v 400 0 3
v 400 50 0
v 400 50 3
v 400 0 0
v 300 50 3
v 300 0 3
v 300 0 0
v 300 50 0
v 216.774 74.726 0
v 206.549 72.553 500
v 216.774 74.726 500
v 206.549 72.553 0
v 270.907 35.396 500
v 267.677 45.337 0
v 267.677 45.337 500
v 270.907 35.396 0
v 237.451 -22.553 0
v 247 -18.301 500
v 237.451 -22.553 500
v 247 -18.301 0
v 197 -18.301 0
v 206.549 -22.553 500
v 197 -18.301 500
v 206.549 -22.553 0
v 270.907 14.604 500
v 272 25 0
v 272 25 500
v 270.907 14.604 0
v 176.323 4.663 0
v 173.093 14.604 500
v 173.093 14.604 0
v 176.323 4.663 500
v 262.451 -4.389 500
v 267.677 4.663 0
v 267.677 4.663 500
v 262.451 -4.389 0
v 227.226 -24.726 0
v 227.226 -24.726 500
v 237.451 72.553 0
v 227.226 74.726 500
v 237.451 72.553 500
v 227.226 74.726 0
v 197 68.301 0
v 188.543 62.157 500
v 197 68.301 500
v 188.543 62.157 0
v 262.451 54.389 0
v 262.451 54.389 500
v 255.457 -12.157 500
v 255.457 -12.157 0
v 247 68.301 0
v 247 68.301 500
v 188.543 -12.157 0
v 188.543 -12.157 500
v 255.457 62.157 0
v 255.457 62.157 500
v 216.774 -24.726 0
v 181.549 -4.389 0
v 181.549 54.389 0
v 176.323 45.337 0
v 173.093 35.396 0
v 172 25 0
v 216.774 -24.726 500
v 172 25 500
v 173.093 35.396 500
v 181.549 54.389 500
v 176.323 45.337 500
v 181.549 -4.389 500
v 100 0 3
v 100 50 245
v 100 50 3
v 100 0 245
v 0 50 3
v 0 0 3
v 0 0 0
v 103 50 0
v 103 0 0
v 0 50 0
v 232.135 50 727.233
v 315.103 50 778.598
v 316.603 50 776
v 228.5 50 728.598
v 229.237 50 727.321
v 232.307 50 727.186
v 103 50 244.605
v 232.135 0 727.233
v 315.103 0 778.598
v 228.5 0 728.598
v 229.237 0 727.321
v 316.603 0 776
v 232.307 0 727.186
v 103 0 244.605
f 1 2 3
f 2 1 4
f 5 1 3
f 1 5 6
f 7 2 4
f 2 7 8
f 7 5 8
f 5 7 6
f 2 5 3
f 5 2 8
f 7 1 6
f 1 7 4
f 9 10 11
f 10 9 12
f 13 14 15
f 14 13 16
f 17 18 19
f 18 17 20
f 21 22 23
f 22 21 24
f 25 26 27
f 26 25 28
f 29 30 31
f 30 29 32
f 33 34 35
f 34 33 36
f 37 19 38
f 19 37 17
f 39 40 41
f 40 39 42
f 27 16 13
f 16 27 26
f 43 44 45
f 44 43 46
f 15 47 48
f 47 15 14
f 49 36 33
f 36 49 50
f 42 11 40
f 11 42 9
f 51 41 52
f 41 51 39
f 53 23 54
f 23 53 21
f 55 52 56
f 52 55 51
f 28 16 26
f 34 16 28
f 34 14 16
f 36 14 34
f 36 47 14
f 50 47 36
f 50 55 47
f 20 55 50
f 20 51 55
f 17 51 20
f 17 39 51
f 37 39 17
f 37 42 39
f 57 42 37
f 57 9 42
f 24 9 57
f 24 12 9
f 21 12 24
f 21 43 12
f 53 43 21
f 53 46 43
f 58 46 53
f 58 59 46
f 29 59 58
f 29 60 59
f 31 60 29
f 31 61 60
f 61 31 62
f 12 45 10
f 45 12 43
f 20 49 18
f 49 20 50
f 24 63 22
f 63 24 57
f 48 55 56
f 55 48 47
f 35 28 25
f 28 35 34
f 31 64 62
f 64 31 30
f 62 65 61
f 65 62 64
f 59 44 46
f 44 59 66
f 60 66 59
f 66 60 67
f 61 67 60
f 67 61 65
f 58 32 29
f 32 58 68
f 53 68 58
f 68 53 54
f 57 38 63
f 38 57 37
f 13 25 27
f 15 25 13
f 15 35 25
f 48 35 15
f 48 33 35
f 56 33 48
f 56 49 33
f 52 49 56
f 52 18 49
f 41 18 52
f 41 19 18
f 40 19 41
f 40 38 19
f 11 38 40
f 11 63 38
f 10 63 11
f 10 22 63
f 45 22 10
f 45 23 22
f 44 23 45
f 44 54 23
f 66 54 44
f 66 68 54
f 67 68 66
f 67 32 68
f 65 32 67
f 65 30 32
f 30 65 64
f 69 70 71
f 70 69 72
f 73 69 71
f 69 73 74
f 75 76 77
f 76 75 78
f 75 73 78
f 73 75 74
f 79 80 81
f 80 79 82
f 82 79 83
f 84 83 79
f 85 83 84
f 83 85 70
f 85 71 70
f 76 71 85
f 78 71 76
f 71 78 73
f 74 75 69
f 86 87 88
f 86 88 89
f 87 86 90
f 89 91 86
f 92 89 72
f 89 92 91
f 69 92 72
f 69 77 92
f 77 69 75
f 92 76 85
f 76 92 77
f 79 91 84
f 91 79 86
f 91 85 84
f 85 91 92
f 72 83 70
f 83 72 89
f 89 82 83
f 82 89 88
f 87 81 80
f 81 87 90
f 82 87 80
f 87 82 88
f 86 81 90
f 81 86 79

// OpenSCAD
// variables en mm
epaisseur = 3;
largeur = 50;
// cylindre intérieur

translate([222,25,0])
    cylinder(500,50,50,false);
// premiere branche
cube([100,largeur,epaisseur],[0,0,0]);
translate([100,0,0])
    cube([epaisseur,largeur,245]);
translate([100,0,0])
    translate([0,0,245])
        rotate([0,15,0])    
            cube([epaisseur,largeur,500]);
translate([0,0,726])
    translate([230,0,0])
        rotate([0,-30,0])
            cube([100,largeur,epaisseur]);
translate([0,0,776])
    translate([315,0,0])
        polyhedron(
            points = [
            [0,0,0],     //0
            [epaisseur,0,0,],    //1
            [epaisseur,largeur,0],   //2
            [0,largeur,0],   //3
            [0,0.75 * largeur,65],   //4
            [epaisseur,0.75 * largeur,65] ,  //5
            ],
            faces = [
            [4,0,3],
            [0,4,5,1],
            [0,1,2,3],
            [3,2,4,5],
            [1,5,2]
            ]
        );
 translate([300,0,0])
    {
        cube([100,largeur,epaisseur],[0,0,0]);
        polyhedron(
        points = [
        [ 0,0,0 ], //0
        [ epaisseur,0,0 ], //1
        [ epaisseur,largeur,0 ], //2
        [ 0,largeur,0 ], //3
        [ 0,0,500], //4
        [ epaisseur,0,500 ], //5
        [ epaisseur,largeur,570 ], //6
        [ 0,largeur,570 ], //7
        ],
        faces = [
        [ 0,3,7,4 ] ,
        [ 0,1,2,3 ] ,
        [ 3,2,6,7 ] ,
        [ 7,6,5,4 ] ,
        [ 4,5,1,0 ] ,
        [ 1,2,6,5 ] ,
        ]
        );
        //echo(atan(70/largeur));
        //translate([0,0,500])
            //rotate([ 0,-45,0])
                //rotate([0,0,-atan(70/largeur)])
                    polyhedron(
                    points = [
                    [ 0,0,500 ] , // 0
                    [ epaisseur,0,500 ] , // 1
                    [ epaisseur,largeur,570 ] , // 2
                    [ 0,largeur,570 ] , // 3
                    [ -105,0, 600] , // 4
                    [ -105+epaisseur, 0, 600 ] , // 5
                    [ -85+epaisseur, largeur, 670] , // 6
                    [ -85, largeur, 670 ] , // 7
                    ] ,
                    faces = [
                    [ 0,3,7,4 ] ,
                    [ 0,1,2,3 ] ,
                    [ 3,2,6,7 ] ,
                    [ 7,6,5,4 ] ,
                    [ 4,5,1,0 ] ,
                    [ 1,2,6,5 ] ,
                    ]
                    );
    }
